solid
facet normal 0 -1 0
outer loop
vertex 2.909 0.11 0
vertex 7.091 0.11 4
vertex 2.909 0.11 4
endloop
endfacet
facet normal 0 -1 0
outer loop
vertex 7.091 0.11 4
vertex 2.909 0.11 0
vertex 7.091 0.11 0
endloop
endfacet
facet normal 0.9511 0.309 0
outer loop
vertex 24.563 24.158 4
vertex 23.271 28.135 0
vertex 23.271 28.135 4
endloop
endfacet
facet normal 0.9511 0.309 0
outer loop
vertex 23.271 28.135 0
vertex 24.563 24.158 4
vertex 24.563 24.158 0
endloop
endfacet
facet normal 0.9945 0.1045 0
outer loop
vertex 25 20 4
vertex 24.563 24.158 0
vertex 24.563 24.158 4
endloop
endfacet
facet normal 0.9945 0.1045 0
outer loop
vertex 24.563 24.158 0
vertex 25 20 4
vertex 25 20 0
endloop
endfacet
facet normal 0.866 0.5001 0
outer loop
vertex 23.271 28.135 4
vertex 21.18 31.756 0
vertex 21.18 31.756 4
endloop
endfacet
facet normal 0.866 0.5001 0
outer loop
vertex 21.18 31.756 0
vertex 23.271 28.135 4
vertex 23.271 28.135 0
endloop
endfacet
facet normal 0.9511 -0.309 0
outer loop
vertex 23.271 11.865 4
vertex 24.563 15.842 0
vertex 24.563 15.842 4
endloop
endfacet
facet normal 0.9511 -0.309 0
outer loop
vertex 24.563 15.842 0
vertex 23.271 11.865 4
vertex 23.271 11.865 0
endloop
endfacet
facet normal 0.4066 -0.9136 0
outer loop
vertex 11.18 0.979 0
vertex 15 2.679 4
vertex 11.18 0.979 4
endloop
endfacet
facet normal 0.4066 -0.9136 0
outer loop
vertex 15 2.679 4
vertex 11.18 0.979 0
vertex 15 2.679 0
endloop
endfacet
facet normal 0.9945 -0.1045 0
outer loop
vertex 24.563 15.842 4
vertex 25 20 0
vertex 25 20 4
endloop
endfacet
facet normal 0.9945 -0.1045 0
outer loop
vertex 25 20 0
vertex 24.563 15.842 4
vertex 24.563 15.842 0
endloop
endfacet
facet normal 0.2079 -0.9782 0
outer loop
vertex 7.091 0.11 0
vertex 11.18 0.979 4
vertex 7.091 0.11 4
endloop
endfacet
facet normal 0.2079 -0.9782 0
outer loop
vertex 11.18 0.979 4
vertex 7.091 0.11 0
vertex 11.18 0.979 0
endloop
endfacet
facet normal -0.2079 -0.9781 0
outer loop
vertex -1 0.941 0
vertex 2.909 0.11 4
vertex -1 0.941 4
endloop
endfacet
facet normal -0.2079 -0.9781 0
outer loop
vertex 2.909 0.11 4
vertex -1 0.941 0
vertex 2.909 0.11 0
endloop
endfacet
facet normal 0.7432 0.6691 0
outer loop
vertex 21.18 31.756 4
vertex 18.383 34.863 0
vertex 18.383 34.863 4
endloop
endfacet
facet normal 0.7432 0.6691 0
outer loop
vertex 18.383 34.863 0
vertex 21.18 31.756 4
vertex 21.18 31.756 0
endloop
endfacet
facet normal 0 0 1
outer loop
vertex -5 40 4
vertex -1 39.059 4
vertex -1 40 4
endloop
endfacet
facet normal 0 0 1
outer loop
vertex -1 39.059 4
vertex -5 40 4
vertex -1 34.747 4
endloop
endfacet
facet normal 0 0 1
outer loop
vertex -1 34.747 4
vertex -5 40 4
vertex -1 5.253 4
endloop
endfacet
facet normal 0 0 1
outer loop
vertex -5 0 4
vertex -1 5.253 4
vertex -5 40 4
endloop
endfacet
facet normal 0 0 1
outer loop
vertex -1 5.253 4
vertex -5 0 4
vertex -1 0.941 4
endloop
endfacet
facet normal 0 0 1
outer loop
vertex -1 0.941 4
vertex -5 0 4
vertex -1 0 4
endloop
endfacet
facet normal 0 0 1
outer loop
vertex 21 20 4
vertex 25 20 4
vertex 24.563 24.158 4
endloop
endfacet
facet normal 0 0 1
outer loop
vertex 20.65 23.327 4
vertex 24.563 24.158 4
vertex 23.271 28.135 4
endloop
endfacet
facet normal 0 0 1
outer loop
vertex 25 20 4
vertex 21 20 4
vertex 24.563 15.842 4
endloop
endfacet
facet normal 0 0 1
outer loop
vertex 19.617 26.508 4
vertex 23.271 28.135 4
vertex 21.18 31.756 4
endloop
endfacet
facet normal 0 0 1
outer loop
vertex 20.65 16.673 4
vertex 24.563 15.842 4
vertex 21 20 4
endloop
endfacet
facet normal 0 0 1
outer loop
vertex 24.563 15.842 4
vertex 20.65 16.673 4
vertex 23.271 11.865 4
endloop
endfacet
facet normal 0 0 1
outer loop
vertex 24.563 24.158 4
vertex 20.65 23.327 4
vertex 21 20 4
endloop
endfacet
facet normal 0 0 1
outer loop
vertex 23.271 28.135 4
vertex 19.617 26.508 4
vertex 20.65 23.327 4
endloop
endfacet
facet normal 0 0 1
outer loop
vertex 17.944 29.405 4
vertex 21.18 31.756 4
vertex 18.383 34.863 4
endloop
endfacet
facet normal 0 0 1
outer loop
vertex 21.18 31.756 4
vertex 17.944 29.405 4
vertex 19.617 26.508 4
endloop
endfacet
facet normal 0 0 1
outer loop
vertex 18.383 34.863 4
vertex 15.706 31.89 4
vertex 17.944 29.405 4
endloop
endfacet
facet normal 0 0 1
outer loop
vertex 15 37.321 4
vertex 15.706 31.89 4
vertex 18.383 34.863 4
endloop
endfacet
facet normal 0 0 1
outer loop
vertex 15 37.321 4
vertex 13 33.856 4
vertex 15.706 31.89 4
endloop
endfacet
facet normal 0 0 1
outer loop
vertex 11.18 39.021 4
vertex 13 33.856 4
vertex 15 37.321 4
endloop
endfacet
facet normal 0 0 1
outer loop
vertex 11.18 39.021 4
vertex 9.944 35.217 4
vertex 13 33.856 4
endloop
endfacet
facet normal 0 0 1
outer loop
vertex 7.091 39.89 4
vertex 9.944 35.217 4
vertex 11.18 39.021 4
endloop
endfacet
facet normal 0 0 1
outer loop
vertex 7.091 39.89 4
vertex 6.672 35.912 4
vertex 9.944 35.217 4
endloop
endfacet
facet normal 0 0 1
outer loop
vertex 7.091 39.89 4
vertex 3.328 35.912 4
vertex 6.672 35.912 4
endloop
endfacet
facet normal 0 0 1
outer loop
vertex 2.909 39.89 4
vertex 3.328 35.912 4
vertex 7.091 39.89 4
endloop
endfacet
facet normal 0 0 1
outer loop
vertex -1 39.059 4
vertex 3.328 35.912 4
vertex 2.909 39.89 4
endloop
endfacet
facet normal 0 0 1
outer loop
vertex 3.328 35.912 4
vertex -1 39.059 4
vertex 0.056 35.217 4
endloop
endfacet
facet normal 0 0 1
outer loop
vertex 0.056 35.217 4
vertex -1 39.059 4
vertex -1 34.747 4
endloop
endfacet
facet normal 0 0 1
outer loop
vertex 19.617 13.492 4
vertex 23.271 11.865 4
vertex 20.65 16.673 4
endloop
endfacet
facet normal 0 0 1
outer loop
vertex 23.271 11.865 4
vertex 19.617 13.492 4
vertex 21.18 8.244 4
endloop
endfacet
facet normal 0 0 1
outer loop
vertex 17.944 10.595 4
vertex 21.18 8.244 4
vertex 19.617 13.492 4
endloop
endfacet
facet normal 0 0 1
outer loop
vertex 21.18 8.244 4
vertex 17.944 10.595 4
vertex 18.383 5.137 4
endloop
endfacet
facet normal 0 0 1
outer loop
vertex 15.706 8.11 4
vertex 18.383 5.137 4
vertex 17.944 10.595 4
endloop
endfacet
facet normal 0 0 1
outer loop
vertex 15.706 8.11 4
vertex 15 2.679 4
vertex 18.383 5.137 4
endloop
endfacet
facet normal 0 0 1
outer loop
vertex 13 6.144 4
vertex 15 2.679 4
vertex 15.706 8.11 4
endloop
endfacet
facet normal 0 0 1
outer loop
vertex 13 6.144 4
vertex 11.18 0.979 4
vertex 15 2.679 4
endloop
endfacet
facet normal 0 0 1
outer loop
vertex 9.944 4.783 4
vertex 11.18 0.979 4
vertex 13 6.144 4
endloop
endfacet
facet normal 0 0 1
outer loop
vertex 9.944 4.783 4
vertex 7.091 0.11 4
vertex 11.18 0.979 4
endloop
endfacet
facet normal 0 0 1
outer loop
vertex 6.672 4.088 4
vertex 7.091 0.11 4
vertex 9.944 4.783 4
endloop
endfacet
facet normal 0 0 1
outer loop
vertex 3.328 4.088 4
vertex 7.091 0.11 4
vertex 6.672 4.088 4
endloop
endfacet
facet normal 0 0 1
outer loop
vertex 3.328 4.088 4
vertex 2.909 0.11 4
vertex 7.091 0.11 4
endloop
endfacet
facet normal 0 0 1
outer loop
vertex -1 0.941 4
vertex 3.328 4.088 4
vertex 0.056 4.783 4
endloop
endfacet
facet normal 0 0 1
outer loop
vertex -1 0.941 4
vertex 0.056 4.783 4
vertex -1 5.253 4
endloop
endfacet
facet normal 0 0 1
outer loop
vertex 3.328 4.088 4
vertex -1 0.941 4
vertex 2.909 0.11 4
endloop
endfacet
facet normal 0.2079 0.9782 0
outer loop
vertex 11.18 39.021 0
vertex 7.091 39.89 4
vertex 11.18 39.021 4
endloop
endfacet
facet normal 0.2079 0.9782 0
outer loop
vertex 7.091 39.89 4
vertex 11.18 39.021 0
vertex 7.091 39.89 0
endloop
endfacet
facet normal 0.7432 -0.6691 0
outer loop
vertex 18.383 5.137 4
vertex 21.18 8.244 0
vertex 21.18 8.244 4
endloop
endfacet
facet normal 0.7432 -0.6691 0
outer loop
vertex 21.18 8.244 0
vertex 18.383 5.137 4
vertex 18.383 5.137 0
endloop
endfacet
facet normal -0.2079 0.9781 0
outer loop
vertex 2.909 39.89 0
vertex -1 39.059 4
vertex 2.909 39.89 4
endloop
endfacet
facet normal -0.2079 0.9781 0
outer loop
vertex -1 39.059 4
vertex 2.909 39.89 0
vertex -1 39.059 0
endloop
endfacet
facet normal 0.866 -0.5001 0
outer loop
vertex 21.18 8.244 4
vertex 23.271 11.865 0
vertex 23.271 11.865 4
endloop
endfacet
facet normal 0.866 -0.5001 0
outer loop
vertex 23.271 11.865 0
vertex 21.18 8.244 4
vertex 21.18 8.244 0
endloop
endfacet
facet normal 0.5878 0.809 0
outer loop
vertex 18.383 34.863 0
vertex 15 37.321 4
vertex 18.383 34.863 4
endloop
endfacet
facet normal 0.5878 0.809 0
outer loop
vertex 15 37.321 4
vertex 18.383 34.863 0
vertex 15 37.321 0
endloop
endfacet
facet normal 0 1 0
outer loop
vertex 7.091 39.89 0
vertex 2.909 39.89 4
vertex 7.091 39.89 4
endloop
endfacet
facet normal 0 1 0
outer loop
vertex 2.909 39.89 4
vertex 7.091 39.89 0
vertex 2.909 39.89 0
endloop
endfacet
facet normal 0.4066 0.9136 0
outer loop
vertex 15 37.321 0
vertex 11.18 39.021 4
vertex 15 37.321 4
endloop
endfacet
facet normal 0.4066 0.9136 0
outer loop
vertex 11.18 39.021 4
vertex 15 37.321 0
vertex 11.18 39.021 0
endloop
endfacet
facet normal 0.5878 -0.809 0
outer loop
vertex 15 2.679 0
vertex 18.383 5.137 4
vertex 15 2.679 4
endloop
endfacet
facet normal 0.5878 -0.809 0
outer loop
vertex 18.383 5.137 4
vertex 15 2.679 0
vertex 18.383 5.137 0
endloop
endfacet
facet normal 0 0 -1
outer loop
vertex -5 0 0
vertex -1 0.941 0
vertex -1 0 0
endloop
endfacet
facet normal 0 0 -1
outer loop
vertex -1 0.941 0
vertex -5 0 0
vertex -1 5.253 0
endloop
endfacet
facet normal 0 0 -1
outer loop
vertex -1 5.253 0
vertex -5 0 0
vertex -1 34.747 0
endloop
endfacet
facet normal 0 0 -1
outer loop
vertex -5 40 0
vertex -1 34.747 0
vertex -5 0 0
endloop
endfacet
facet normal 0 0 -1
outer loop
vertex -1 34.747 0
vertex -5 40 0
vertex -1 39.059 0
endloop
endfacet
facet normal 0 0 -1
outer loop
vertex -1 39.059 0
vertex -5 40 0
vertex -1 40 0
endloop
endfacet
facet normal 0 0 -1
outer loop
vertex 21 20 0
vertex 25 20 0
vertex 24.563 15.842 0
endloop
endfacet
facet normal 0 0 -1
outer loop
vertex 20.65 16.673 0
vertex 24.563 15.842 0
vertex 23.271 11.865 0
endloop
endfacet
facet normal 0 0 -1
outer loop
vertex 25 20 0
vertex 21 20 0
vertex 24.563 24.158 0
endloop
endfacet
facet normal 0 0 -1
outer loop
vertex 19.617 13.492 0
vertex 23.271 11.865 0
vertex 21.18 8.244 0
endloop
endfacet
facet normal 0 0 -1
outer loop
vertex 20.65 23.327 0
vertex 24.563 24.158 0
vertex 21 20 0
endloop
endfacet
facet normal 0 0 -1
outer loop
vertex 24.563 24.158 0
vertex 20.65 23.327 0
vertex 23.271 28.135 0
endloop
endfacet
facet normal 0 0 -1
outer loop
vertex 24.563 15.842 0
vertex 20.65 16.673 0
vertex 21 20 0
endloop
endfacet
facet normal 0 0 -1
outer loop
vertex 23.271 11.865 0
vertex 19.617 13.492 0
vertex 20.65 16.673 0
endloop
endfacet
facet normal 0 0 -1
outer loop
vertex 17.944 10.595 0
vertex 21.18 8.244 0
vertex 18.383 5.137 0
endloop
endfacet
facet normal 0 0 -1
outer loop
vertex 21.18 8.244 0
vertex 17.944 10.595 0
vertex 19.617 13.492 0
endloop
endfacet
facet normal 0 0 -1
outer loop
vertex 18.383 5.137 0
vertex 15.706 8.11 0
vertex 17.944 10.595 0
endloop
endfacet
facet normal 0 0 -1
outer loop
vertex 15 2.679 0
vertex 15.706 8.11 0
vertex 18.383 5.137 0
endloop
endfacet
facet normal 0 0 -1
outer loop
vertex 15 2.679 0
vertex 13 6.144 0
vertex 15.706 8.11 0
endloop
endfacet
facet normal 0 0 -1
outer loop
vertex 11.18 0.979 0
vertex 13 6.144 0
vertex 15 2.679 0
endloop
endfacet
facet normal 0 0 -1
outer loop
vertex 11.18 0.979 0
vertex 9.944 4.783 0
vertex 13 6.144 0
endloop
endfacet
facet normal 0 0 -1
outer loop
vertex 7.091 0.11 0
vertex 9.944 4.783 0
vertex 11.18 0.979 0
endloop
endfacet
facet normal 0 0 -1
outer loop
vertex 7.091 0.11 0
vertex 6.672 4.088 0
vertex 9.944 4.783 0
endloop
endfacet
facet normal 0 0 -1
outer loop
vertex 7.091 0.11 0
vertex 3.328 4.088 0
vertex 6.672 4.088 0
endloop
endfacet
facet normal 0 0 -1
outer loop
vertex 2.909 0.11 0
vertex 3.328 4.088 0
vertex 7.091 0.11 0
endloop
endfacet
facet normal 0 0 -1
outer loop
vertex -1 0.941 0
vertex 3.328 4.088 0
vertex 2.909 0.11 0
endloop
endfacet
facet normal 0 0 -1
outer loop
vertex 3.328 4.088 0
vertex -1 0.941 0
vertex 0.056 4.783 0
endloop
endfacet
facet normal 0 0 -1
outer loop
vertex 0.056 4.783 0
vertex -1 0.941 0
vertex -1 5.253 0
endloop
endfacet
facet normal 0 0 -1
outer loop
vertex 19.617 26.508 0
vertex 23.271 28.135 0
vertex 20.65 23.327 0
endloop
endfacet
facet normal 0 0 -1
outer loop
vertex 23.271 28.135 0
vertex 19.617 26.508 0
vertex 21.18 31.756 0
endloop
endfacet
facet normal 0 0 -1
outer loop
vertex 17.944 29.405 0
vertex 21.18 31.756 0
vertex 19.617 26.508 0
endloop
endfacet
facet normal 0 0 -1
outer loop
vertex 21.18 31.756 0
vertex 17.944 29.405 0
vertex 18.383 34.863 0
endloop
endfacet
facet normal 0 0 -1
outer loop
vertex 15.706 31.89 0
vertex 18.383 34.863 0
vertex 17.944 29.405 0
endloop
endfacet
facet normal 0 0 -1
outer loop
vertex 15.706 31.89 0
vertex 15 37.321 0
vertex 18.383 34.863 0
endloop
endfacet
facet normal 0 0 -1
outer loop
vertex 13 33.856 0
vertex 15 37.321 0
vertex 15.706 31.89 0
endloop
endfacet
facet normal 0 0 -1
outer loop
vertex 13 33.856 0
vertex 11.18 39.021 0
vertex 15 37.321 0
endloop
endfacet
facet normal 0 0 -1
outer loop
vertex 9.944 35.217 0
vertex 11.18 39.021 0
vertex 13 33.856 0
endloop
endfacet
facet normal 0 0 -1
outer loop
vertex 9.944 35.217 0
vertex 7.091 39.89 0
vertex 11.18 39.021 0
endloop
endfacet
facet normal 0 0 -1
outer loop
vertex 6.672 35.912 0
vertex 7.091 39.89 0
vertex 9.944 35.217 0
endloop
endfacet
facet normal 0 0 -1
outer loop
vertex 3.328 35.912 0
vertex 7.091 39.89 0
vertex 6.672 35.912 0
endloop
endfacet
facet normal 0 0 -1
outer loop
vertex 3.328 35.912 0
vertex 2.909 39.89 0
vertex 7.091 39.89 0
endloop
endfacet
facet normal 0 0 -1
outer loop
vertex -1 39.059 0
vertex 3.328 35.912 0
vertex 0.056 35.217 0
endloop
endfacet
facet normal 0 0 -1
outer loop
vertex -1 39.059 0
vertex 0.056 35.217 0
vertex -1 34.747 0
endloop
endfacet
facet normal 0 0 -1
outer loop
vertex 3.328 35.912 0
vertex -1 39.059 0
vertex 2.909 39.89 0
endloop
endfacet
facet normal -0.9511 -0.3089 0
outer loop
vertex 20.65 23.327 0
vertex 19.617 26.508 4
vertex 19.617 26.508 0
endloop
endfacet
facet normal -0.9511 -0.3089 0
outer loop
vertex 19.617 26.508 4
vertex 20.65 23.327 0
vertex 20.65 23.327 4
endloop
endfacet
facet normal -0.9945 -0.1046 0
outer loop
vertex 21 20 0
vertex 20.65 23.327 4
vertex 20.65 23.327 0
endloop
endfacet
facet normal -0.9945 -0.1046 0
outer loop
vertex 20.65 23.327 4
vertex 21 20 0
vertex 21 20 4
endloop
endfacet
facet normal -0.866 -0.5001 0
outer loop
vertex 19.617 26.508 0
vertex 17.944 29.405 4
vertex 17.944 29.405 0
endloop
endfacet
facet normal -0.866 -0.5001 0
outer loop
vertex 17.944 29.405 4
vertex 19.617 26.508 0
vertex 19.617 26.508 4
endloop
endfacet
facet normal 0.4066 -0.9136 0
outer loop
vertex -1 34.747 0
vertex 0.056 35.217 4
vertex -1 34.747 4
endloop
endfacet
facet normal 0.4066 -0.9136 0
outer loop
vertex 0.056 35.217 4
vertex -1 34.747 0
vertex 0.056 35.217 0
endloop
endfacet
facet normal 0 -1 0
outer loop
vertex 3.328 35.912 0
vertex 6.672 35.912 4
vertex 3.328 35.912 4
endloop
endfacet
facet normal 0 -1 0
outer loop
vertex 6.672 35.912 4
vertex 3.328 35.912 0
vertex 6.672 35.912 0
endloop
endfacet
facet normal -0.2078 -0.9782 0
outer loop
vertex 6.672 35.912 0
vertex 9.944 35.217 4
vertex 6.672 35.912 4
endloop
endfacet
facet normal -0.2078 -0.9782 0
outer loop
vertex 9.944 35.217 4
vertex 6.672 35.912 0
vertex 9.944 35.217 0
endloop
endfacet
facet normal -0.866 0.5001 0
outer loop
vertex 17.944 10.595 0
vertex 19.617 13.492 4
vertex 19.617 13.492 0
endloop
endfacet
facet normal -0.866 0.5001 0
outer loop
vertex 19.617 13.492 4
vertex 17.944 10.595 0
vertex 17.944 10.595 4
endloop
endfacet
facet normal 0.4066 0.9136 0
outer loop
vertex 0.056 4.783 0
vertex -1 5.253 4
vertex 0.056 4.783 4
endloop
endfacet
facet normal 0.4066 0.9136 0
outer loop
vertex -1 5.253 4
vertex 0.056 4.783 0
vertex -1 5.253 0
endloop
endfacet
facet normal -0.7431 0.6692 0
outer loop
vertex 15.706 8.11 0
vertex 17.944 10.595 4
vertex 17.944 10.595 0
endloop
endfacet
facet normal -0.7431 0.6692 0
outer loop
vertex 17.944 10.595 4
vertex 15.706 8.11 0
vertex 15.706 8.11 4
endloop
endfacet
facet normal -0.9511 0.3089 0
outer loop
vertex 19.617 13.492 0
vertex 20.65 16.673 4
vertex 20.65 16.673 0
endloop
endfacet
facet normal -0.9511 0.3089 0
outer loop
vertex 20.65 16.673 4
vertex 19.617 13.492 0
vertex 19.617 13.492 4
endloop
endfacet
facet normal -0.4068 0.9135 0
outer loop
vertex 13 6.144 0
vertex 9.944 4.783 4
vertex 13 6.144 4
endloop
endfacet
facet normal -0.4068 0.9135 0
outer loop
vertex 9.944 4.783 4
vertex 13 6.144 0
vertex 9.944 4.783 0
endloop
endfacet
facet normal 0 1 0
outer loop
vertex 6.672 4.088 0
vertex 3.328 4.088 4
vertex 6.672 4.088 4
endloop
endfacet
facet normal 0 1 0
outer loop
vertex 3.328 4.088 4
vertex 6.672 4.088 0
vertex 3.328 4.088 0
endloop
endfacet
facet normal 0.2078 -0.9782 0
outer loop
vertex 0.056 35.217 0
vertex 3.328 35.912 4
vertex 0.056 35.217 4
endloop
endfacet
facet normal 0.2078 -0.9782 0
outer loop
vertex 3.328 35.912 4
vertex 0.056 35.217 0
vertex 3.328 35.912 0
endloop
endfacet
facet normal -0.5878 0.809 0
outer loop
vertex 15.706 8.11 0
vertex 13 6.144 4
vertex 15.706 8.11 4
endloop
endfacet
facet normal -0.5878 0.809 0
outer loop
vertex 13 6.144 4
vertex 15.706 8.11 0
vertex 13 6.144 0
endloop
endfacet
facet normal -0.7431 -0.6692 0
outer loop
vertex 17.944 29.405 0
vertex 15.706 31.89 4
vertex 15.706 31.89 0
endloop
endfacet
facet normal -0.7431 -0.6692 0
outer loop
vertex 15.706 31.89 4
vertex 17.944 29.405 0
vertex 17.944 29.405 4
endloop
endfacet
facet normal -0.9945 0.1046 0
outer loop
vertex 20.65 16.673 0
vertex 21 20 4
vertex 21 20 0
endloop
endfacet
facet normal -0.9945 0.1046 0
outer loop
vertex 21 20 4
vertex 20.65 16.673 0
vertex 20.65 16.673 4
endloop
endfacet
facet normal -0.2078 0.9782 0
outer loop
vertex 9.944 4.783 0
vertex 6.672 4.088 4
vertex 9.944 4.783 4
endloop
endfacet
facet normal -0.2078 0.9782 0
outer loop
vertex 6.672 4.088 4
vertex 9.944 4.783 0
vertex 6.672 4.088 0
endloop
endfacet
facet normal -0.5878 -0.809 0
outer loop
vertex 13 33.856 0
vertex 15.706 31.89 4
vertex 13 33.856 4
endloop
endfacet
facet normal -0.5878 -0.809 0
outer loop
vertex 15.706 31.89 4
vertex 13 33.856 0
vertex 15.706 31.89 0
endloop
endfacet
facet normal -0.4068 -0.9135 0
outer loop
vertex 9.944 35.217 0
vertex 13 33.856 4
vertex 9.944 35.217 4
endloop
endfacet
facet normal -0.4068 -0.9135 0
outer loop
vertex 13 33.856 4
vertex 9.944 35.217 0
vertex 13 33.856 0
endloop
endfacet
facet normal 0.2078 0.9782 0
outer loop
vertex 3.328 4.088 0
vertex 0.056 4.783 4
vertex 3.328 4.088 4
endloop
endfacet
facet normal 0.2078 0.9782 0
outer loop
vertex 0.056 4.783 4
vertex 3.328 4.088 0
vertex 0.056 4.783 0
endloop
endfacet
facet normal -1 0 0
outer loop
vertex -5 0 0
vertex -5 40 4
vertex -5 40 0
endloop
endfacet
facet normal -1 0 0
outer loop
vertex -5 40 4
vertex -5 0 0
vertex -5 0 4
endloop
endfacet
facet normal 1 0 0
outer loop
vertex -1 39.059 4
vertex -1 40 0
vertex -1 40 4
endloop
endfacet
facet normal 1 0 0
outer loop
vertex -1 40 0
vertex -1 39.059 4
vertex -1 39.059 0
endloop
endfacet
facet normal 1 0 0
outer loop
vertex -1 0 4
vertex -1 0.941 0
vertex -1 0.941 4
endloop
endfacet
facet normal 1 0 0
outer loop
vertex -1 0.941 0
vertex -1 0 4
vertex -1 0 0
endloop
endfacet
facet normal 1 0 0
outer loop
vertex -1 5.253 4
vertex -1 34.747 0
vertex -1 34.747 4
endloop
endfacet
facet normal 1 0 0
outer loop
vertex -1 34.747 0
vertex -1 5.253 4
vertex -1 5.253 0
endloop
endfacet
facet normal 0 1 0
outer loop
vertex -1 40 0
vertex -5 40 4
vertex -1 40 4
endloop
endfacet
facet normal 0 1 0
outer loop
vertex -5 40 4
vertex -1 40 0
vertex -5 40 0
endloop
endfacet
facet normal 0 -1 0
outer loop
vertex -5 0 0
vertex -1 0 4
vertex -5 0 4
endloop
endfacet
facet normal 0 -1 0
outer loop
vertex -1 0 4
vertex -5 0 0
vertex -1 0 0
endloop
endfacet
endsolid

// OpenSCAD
union(){ 
 translate([-5,0,0]) cube([4,40,4]);
difference(){
 translate([5,20,0]) cylinder(4,20,20);
 translate([5,20,-1]) cylinder(6,16,16);
 translate([-15,0,-1]) cube([10,40,6]);
}
}
